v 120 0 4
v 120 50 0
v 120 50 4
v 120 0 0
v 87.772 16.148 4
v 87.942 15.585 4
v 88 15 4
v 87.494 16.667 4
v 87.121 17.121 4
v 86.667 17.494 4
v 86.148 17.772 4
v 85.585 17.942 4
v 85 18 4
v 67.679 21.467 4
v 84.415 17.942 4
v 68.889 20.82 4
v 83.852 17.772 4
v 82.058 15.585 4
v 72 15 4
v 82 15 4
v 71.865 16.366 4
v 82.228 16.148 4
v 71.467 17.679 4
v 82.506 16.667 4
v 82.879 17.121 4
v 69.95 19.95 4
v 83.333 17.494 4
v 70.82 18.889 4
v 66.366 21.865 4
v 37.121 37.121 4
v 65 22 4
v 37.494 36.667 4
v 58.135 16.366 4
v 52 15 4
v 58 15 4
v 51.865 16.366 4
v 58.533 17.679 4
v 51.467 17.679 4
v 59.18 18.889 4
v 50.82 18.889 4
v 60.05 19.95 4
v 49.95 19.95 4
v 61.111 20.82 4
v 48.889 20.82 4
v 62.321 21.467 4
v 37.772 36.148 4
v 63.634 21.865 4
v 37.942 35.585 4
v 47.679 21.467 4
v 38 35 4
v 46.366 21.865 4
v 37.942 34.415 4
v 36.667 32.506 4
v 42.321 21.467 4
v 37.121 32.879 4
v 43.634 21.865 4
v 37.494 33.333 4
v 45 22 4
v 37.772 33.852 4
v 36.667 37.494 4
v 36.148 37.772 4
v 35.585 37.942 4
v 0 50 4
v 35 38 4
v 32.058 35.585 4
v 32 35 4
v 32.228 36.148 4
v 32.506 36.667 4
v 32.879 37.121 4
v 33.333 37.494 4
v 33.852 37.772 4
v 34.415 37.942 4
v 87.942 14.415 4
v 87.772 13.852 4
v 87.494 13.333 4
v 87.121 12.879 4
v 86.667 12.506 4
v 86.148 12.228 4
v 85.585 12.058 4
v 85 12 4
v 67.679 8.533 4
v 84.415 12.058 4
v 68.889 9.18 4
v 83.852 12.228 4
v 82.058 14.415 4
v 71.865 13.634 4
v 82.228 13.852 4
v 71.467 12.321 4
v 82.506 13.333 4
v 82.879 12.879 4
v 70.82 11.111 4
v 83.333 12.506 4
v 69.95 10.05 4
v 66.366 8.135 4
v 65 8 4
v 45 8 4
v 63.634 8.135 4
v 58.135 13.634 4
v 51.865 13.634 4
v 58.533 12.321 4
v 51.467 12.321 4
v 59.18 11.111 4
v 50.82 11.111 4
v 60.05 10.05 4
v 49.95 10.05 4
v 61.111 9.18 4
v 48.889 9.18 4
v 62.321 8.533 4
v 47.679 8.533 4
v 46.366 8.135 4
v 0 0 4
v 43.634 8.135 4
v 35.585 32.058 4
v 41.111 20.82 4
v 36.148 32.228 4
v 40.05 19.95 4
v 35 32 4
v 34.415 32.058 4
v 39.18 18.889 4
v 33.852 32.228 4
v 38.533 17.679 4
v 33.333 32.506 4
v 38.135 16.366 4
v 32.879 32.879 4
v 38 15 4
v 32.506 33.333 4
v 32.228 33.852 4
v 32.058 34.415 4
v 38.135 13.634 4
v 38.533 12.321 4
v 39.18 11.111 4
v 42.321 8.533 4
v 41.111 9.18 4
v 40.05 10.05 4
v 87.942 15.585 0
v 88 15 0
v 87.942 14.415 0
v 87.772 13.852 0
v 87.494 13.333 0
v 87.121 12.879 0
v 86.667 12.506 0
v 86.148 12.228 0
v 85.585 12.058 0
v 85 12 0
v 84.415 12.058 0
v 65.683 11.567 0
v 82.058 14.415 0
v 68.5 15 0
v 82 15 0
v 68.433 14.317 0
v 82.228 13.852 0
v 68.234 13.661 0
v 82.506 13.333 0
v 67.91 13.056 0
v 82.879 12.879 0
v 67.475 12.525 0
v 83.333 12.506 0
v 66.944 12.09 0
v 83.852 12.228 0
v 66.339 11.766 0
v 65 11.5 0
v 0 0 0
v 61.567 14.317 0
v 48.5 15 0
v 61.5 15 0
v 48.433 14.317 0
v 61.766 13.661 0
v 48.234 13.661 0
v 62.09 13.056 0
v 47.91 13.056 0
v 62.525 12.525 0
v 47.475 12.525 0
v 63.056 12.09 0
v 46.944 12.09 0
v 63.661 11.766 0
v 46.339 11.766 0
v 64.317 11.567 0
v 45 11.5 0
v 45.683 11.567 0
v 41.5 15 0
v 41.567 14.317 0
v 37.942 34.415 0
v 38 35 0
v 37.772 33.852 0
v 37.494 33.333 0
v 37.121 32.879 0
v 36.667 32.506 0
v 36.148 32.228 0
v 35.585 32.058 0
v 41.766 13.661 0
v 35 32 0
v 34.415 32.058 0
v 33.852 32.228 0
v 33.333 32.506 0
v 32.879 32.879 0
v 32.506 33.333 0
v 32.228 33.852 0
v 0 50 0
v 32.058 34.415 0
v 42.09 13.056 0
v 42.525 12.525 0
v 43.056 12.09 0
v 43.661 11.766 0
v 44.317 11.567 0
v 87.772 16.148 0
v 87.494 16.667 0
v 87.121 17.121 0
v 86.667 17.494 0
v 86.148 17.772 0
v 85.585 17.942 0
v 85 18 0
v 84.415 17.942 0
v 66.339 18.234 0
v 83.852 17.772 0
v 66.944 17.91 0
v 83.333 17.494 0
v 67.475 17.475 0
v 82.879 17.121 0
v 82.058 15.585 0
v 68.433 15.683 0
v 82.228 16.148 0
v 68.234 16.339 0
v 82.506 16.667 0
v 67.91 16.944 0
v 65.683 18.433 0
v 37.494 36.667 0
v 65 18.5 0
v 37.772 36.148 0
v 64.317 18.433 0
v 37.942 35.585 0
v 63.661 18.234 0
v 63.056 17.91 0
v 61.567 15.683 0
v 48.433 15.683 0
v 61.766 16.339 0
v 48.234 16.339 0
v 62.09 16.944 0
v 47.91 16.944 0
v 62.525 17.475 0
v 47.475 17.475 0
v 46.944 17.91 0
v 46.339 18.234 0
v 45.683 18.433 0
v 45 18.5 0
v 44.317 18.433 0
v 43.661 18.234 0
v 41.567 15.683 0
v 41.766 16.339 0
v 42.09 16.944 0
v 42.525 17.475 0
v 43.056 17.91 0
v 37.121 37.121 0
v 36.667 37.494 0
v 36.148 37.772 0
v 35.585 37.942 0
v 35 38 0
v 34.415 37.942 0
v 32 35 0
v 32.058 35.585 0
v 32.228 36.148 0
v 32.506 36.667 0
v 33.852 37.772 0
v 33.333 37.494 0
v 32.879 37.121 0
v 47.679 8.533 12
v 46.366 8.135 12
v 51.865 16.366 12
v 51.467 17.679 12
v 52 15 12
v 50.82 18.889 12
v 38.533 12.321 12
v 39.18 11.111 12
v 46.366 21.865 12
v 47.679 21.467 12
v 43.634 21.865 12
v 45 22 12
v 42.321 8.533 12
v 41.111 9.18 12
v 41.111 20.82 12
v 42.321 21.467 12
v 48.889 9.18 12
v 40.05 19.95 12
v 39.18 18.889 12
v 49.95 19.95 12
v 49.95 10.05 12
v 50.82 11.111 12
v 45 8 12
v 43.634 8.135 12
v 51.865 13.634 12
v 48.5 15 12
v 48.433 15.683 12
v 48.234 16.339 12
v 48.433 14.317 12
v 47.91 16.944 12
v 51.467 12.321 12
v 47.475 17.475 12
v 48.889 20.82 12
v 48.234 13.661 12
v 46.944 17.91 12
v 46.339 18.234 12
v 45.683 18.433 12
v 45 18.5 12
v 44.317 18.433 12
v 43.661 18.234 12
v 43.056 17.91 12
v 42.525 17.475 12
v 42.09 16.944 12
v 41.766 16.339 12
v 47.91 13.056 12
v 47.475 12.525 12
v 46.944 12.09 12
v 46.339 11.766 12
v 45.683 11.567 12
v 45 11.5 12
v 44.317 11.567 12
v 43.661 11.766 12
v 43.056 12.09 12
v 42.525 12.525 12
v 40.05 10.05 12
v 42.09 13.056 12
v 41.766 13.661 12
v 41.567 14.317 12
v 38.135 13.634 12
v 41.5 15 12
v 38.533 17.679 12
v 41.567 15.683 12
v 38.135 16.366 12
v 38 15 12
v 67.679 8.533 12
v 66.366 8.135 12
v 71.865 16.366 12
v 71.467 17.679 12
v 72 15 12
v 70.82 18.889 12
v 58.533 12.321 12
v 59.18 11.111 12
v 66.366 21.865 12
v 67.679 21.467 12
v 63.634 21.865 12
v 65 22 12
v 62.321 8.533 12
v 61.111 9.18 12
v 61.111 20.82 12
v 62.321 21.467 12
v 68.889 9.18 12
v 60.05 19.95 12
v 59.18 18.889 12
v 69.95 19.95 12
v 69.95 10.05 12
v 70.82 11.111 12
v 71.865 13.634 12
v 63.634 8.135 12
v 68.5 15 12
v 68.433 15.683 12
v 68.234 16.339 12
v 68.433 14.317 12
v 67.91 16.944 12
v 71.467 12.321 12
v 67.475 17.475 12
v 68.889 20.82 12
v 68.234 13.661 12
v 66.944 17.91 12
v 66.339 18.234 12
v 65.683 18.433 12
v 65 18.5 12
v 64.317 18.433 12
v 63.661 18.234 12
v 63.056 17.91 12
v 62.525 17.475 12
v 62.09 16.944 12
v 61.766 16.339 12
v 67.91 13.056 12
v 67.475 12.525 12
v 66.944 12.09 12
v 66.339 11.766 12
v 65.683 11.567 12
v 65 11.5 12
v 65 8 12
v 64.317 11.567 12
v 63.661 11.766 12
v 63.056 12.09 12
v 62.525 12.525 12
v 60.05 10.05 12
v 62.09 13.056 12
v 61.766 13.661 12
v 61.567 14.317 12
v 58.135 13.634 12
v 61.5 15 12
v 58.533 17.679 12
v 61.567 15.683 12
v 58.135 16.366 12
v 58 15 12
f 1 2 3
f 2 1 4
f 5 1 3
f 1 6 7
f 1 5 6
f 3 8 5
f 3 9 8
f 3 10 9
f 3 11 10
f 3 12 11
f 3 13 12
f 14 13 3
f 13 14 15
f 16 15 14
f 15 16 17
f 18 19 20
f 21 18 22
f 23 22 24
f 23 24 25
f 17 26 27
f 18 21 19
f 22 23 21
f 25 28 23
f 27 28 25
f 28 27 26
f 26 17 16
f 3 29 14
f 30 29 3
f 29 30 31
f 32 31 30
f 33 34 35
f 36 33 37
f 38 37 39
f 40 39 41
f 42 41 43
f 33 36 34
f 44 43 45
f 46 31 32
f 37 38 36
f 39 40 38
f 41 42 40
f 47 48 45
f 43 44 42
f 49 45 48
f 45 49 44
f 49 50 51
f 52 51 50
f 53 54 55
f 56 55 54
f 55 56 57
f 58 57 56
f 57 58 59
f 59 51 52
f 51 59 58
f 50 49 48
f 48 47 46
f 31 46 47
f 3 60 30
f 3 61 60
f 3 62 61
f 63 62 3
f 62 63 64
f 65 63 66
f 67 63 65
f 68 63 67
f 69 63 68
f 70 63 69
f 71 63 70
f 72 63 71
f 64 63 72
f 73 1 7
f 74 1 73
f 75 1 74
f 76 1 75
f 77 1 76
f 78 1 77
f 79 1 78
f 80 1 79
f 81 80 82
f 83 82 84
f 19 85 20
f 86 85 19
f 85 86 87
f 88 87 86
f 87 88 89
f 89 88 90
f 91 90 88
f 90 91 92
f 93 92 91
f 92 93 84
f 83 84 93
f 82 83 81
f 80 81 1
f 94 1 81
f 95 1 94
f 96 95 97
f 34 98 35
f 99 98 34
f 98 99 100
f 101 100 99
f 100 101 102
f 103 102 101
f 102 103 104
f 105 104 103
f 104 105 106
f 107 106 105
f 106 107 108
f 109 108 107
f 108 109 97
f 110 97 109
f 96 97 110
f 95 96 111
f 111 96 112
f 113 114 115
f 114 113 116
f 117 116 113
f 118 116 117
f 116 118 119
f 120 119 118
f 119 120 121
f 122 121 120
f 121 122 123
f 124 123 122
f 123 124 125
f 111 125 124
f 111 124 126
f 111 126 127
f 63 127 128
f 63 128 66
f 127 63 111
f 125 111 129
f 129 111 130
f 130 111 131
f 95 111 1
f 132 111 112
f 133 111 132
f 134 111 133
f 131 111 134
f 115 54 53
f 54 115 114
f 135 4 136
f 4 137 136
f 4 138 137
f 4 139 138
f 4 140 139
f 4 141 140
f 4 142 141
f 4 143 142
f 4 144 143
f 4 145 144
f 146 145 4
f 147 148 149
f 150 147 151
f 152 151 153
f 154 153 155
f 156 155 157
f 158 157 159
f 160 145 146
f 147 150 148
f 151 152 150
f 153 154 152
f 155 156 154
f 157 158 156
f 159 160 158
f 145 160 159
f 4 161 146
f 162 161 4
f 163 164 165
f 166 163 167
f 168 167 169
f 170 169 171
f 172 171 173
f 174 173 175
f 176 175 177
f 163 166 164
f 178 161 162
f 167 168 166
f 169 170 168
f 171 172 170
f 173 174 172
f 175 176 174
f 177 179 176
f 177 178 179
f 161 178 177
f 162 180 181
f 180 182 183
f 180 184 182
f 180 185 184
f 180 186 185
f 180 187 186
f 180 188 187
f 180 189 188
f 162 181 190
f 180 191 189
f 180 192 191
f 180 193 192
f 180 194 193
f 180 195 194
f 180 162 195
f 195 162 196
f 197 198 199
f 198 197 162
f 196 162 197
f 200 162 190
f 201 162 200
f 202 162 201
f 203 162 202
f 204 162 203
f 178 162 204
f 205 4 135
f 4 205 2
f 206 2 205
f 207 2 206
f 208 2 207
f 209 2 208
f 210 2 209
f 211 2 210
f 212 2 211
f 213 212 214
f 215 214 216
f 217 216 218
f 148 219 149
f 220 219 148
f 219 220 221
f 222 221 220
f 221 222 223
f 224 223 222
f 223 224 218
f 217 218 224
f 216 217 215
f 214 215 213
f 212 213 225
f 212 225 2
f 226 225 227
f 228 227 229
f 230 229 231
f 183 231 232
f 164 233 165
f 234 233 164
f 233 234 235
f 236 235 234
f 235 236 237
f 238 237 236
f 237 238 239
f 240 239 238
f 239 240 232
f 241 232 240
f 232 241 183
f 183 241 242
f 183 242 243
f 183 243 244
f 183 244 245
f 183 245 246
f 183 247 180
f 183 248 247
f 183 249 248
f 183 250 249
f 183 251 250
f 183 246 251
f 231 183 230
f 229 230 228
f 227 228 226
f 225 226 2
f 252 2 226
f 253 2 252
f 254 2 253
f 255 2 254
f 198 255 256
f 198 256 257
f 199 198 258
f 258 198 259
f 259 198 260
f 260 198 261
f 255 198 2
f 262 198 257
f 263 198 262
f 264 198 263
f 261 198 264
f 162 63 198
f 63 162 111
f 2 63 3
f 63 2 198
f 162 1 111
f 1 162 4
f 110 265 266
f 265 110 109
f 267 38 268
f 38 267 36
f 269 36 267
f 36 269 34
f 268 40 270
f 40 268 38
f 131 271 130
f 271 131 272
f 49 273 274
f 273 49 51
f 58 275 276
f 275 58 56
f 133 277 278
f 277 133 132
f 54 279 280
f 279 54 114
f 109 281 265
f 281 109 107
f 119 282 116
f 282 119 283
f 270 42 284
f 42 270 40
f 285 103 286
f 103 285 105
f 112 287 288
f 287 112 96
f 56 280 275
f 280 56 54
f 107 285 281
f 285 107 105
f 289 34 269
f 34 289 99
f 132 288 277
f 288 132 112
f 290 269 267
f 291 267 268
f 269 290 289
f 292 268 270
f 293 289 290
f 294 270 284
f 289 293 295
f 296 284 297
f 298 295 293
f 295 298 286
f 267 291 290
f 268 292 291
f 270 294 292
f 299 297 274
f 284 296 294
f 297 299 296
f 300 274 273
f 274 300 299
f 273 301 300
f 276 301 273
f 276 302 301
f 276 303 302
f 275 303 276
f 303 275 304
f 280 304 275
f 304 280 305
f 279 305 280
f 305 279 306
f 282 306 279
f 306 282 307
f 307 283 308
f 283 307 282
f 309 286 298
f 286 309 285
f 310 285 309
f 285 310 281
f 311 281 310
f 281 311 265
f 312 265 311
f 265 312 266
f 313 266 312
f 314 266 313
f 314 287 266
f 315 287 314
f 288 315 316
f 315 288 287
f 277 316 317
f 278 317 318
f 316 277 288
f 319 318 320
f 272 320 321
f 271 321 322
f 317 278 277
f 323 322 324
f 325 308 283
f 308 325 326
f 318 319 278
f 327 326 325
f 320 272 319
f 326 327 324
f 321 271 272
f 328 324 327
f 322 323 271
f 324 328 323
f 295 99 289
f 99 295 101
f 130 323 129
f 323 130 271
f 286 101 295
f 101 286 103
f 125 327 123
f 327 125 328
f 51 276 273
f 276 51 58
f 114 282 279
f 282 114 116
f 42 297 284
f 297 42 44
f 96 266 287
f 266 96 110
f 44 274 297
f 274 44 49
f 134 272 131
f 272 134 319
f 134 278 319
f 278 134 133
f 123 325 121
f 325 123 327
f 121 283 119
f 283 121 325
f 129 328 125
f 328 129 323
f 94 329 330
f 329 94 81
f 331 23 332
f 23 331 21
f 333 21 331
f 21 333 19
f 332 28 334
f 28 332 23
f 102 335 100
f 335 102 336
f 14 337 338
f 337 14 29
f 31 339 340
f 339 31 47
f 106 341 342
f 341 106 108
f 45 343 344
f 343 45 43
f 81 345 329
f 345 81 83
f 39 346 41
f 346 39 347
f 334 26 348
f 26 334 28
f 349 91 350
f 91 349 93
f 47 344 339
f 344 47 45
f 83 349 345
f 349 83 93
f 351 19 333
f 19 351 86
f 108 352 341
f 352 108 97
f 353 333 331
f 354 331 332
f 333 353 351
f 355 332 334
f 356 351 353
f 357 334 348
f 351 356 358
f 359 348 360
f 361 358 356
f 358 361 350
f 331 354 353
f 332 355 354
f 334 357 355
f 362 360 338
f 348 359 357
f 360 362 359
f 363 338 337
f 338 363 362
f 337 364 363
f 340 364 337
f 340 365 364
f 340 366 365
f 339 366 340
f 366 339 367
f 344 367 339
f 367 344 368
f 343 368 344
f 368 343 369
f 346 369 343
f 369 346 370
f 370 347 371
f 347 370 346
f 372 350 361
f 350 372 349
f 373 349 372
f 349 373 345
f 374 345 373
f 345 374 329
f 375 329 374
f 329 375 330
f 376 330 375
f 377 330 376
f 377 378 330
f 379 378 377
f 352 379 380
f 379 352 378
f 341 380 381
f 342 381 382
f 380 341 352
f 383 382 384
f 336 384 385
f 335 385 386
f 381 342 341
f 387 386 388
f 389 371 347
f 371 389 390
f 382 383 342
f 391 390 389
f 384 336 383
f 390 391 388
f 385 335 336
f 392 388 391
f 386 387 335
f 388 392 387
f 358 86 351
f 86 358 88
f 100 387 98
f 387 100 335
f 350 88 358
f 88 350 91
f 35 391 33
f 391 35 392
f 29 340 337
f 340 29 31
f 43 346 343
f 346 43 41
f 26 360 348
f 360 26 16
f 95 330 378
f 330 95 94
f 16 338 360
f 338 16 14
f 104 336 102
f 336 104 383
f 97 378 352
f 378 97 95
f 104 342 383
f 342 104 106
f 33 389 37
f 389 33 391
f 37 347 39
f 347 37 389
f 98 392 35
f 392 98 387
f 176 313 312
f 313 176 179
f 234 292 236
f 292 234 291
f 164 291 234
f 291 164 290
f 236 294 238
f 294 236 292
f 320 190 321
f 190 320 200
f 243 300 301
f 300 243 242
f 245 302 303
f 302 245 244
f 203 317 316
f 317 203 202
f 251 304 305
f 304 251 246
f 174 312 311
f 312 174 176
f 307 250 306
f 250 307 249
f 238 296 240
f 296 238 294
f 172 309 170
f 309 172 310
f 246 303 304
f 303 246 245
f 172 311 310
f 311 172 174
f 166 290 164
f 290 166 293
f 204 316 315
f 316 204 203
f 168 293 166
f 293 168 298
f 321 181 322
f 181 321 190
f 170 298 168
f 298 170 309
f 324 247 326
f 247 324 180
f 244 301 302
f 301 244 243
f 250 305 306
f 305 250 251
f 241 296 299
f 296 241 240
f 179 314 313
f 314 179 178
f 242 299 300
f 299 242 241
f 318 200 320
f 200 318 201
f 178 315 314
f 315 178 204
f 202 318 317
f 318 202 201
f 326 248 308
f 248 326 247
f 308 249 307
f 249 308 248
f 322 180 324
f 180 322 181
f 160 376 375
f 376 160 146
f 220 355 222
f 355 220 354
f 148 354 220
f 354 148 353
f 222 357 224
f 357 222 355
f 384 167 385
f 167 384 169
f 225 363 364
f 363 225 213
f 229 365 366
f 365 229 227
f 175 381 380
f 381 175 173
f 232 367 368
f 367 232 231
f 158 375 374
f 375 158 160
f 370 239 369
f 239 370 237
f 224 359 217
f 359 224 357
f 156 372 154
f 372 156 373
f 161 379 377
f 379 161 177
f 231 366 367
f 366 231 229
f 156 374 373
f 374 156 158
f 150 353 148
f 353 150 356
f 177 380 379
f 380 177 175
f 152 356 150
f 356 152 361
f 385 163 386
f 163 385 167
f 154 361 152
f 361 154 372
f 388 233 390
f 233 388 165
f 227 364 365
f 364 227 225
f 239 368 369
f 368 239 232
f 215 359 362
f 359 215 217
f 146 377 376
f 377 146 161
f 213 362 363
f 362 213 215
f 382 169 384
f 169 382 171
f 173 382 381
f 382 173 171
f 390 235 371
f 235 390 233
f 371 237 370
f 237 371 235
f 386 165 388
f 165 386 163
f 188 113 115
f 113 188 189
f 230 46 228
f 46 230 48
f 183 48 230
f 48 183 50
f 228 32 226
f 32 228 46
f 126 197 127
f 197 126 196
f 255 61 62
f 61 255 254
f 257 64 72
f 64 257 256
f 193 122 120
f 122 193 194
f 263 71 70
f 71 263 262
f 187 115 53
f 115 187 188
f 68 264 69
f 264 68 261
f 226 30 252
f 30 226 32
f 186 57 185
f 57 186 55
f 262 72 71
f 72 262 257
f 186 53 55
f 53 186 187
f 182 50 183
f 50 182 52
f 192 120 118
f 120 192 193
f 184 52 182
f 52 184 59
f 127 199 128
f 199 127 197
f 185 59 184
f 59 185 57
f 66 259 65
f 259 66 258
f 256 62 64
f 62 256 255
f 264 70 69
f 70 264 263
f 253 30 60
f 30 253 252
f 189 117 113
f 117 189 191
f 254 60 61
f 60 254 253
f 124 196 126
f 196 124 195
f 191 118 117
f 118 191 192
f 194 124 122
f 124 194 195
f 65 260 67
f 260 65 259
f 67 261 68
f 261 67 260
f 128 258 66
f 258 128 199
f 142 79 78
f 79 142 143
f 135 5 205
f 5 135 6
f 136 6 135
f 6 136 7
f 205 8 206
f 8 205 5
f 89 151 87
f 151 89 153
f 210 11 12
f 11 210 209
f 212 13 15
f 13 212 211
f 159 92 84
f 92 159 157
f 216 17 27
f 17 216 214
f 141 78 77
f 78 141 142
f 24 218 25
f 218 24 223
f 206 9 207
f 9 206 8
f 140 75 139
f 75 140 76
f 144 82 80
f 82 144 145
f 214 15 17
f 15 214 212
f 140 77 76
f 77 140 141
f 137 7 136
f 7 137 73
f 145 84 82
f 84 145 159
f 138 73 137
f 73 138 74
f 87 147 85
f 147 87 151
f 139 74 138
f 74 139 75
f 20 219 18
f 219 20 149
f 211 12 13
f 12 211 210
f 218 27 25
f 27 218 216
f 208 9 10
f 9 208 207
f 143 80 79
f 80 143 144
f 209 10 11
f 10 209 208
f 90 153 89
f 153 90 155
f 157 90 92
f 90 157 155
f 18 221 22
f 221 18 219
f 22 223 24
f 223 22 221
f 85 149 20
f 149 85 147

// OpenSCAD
$fn = 32;

// ----------------------------------------------------------------------
// Mixed field: bosses and holes at given coordinates
// ----------------------------------------------------------------------

// --- parameters (mm) ---
plate_l = 120;            // plate length, X
plate_w = 50;             // plate width, Y
plate_t = 4;              // plate thickness, Z
boss_d = 14;              // boss diameter
boss_h = 8;               // boss height above the plate
hole_d = 6;               // through hole diameter

total_h = plate_t + boss_h;  // overall height

difference() {
  union() {
    cube([plate_l, plate_w, plate_t]);
    translate([45, 15, plate_t]) cylinder(h = boss_h, d = boss_d);
    translate([65, 15, plate_t]) cylinder(h = boss_h, d = boss_d);
  }
  translate([45, 15, -1]) cylinder(h = total_h + 2, d = boss_d / 2);
  translate([65, 15, -1]) cylinder(h = total_h + 2, d = boss_d / 2);
  translate([35, 35, -1]) cylinder(h = plate_t + 2, d = hole_d);
  translate([85, 15, -1]) cylinder(h = plate_t + 2, d = hole_d);
}
